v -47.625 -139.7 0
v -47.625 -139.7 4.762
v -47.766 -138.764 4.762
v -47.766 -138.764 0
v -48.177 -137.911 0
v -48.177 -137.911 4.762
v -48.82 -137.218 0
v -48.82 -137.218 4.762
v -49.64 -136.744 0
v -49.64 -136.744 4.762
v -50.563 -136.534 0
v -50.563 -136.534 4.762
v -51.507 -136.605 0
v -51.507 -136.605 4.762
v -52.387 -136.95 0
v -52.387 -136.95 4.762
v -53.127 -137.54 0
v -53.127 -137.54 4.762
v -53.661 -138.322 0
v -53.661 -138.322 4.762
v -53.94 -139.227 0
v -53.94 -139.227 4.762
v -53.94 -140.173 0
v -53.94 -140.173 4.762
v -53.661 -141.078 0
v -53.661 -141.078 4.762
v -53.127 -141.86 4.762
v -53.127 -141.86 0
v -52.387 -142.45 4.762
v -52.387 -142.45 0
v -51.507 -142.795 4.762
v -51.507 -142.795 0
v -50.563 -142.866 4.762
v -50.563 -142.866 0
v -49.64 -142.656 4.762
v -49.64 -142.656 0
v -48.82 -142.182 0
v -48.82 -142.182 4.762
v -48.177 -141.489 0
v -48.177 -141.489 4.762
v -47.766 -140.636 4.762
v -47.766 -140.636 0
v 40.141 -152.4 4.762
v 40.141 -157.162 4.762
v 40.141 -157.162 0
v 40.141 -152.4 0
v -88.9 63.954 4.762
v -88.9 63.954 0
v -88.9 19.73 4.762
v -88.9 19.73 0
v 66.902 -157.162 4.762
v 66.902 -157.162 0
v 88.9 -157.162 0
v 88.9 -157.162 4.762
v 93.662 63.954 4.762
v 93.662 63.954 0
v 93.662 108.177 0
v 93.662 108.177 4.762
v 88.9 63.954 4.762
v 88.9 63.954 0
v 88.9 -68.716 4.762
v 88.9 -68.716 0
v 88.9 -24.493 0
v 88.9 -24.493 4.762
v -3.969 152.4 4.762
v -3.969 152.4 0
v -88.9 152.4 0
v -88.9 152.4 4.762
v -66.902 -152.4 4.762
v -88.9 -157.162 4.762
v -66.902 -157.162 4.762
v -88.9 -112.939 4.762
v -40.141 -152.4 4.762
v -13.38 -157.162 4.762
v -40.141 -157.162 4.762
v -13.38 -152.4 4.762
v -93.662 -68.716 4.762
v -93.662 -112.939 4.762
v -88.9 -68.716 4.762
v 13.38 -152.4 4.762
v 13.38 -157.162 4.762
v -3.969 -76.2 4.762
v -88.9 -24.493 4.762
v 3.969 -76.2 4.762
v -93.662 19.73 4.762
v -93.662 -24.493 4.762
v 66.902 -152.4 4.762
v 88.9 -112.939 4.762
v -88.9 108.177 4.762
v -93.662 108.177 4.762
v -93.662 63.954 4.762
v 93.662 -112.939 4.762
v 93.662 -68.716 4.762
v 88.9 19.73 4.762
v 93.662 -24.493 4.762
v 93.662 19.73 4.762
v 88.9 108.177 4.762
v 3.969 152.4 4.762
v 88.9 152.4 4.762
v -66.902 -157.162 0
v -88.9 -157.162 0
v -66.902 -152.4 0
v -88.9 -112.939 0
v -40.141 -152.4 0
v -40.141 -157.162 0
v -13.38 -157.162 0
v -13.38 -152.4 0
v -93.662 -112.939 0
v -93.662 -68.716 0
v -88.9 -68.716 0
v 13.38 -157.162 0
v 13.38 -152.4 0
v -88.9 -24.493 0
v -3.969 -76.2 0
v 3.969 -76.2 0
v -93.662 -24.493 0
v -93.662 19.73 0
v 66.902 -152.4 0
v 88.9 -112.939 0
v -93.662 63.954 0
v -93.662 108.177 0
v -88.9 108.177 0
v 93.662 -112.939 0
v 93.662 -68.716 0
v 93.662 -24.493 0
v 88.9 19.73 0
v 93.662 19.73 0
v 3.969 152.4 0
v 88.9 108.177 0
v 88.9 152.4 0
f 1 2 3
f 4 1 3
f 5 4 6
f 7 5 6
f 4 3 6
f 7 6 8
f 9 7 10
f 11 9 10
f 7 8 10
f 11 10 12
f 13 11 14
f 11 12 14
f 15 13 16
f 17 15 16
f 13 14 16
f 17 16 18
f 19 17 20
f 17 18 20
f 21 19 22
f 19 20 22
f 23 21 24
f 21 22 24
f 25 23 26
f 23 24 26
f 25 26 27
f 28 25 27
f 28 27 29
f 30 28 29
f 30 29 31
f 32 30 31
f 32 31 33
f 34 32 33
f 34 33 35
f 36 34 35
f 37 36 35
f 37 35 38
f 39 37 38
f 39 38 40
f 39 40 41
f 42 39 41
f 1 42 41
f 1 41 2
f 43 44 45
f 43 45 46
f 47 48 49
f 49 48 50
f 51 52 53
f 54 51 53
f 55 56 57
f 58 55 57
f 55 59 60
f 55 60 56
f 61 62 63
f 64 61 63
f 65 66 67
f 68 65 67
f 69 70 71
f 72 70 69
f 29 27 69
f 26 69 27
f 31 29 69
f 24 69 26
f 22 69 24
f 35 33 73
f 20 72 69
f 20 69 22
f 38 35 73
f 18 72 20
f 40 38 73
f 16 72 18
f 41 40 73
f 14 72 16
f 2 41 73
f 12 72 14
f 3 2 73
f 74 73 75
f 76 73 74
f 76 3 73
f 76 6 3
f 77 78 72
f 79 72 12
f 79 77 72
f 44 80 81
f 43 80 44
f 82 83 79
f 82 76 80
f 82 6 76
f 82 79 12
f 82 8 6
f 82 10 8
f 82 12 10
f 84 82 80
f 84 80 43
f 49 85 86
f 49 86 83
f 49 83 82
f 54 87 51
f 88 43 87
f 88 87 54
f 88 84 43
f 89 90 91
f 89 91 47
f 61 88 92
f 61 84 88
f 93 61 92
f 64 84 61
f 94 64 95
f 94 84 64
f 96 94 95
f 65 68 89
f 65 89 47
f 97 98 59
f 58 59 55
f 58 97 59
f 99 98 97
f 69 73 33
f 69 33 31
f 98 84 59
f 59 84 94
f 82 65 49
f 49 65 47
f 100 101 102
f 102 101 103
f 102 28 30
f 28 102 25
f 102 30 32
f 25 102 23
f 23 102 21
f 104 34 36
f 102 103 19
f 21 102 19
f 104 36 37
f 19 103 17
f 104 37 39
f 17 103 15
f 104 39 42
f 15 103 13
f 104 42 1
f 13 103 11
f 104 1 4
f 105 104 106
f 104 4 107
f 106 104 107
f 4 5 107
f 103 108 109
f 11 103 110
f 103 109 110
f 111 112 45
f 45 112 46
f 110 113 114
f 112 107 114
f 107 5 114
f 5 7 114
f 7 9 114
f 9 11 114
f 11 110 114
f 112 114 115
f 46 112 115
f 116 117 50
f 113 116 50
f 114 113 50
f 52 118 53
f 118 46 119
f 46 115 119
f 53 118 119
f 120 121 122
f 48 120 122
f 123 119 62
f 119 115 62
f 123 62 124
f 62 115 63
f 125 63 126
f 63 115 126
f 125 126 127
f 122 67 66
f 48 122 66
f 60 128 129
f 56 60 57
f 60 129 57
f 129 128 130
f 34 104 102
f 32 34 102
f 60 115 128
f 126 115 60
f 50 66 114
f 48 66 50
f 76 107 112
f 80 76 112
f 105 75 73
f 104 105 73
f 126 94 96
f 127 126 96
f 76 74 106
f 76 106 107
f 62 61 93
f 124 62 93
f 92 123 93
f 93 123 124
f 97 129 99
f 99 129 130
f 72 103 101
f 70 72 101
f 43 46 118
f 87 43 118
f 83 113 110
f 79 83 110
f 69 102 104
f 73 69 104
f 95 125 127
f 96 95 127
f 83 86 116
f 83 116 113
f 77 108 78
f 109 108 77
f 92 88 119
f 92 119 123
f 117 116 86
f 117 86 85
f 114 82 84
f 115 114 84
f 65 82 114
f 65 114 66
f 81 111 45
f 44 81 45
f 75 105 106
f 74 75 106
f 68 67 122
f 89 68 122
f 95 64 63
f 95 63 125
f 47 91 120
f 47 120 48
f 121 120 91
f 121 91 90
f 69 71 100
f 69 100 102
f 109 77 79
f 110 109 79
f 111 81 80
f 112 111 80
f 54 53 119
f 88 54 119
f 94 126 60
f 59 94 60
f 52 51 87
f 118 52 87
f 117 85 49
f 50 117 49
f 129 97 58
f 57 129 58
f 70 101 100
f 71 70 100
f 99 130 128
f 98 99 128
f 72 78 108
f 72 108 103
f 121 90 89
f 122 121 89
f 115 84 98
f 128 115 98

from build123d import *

# Parameters (mm, degrees)
SKETCH2_W           = 4.7625
SKETCH2_H           = 44.223214285
SKETCH2_H_2         = 44.223214286
SKETCH2_W_2         = 21.998214286
SKETCH2_H_3         = 4.7625
SKETCH2_W_3         = 26.760714286
BOSS_EXTRUDE1_DEPTH = 4.7625
SKETCH3_W           = 7.9375
SKETCH3_H           = 228.6
CUT_EXTRUDE1_DEPTH  = 184.017476539
SKETCH4_R           = 3.175
CUT_EXTRUDE2_DEPTH  = 184.017476539


with BuildPart() as part:
    # Sketch2 → Boss-Extrude1 (new body)
    with BuildSketch(Plane.XY):
        Polygon((0, -152.4), (0, 152.4), (-88.9, 152.4), (-88.9, 108.176785714), (-88.9, 63.953571429), (-88.9, 19.730357143), (-88.9, -24.492857143), (-88.9, -68.716071429), (-88.9, -112.939285714), (-88.9, -152.4), (-66.901785714, -152.4), (-40.141071429, -152.4), (-13.380357143, -152.4), align=None)
        Polygon((88.9, 152.4), (0, 152.4), (0, -152.4), (13.380357143, -152.4), (40.141071429, -152.4), (66.901785714, -152.4), (88.9, -152.4), (88.9, -112.939285714), (88.9, -68.716071429), (88.9, -24.492857143), (88.9, 19.730357143), (88.9, 63.953571429), (88.9, 108.176785714), align=None)
        with Locations((-91.28125, 86.065178572)):
            Rectangle(SKETCH2_W, SKETCH2_H)
        with Locations((-91.28125, -2.38125)):
            Rectangle(SKETCH2_W, SKETCH2_H_2)
        with Locations((-91.28125, -90.827678572)):
            Rectangle(SKETCH2_W, SKETCH2_H)
        with Locations((-77.900892857, -154.78125)):
            Rectangle(SKETCH2_W_2, SKETCH2_H_3)
        with Locations((-26.760714286, -154.78125)):
            Rectangle(SKETCH2_W_3, SKETCH2_H_3)
        with Locations((26.760714286, -154.78125)):
            Rectangle(SKETCH2_W_3, SKETCH2_H_3)
        with Locations((91.28125, -90.827678572)):
            Rectangle(SKETCH2_W, SKETCH2_H)
        with Locations((91.28125, -2.38125)):
            Rectangle(SKETCH2_W, SKETCH2_H_2)
        with Locations((91.28125, 86.065178572)):
            Rectangle(SKETCH2_W, SKETCH2_H)
        with Locations((77.900892857, -154.78125)):
            Rectangle(SKETCH2_W_2, SKETCH2_H_3)
    extrude(amount=BOSS_EXTRUDE1_DEPTH)

    # Sketch3 → Cut-Extrude1 (cut, through all)
    with BuildSketch(Plane.XY.offset(4.7625)):
        with Locations((0, 38.1)):
            Rectangle(SKETCH3_W, SKETCH3_H)
    extrude(amount=-CUT_EXTRUDE1_DEPTH, mode=Mode.SUBTRACT)

    # Sketch4 → Cut-Extrude2 (cut, through all)
    with BuildSketch(Plane.XY.offset(4.7625)):
        with Locations((-50.8, -139.7)):
            Circle(SKETCH4_R)
    extrude(amount=-CUT_EXTRUDE2_DEPTH, mode=Mode.SUBTRACT)


solid = part.part
